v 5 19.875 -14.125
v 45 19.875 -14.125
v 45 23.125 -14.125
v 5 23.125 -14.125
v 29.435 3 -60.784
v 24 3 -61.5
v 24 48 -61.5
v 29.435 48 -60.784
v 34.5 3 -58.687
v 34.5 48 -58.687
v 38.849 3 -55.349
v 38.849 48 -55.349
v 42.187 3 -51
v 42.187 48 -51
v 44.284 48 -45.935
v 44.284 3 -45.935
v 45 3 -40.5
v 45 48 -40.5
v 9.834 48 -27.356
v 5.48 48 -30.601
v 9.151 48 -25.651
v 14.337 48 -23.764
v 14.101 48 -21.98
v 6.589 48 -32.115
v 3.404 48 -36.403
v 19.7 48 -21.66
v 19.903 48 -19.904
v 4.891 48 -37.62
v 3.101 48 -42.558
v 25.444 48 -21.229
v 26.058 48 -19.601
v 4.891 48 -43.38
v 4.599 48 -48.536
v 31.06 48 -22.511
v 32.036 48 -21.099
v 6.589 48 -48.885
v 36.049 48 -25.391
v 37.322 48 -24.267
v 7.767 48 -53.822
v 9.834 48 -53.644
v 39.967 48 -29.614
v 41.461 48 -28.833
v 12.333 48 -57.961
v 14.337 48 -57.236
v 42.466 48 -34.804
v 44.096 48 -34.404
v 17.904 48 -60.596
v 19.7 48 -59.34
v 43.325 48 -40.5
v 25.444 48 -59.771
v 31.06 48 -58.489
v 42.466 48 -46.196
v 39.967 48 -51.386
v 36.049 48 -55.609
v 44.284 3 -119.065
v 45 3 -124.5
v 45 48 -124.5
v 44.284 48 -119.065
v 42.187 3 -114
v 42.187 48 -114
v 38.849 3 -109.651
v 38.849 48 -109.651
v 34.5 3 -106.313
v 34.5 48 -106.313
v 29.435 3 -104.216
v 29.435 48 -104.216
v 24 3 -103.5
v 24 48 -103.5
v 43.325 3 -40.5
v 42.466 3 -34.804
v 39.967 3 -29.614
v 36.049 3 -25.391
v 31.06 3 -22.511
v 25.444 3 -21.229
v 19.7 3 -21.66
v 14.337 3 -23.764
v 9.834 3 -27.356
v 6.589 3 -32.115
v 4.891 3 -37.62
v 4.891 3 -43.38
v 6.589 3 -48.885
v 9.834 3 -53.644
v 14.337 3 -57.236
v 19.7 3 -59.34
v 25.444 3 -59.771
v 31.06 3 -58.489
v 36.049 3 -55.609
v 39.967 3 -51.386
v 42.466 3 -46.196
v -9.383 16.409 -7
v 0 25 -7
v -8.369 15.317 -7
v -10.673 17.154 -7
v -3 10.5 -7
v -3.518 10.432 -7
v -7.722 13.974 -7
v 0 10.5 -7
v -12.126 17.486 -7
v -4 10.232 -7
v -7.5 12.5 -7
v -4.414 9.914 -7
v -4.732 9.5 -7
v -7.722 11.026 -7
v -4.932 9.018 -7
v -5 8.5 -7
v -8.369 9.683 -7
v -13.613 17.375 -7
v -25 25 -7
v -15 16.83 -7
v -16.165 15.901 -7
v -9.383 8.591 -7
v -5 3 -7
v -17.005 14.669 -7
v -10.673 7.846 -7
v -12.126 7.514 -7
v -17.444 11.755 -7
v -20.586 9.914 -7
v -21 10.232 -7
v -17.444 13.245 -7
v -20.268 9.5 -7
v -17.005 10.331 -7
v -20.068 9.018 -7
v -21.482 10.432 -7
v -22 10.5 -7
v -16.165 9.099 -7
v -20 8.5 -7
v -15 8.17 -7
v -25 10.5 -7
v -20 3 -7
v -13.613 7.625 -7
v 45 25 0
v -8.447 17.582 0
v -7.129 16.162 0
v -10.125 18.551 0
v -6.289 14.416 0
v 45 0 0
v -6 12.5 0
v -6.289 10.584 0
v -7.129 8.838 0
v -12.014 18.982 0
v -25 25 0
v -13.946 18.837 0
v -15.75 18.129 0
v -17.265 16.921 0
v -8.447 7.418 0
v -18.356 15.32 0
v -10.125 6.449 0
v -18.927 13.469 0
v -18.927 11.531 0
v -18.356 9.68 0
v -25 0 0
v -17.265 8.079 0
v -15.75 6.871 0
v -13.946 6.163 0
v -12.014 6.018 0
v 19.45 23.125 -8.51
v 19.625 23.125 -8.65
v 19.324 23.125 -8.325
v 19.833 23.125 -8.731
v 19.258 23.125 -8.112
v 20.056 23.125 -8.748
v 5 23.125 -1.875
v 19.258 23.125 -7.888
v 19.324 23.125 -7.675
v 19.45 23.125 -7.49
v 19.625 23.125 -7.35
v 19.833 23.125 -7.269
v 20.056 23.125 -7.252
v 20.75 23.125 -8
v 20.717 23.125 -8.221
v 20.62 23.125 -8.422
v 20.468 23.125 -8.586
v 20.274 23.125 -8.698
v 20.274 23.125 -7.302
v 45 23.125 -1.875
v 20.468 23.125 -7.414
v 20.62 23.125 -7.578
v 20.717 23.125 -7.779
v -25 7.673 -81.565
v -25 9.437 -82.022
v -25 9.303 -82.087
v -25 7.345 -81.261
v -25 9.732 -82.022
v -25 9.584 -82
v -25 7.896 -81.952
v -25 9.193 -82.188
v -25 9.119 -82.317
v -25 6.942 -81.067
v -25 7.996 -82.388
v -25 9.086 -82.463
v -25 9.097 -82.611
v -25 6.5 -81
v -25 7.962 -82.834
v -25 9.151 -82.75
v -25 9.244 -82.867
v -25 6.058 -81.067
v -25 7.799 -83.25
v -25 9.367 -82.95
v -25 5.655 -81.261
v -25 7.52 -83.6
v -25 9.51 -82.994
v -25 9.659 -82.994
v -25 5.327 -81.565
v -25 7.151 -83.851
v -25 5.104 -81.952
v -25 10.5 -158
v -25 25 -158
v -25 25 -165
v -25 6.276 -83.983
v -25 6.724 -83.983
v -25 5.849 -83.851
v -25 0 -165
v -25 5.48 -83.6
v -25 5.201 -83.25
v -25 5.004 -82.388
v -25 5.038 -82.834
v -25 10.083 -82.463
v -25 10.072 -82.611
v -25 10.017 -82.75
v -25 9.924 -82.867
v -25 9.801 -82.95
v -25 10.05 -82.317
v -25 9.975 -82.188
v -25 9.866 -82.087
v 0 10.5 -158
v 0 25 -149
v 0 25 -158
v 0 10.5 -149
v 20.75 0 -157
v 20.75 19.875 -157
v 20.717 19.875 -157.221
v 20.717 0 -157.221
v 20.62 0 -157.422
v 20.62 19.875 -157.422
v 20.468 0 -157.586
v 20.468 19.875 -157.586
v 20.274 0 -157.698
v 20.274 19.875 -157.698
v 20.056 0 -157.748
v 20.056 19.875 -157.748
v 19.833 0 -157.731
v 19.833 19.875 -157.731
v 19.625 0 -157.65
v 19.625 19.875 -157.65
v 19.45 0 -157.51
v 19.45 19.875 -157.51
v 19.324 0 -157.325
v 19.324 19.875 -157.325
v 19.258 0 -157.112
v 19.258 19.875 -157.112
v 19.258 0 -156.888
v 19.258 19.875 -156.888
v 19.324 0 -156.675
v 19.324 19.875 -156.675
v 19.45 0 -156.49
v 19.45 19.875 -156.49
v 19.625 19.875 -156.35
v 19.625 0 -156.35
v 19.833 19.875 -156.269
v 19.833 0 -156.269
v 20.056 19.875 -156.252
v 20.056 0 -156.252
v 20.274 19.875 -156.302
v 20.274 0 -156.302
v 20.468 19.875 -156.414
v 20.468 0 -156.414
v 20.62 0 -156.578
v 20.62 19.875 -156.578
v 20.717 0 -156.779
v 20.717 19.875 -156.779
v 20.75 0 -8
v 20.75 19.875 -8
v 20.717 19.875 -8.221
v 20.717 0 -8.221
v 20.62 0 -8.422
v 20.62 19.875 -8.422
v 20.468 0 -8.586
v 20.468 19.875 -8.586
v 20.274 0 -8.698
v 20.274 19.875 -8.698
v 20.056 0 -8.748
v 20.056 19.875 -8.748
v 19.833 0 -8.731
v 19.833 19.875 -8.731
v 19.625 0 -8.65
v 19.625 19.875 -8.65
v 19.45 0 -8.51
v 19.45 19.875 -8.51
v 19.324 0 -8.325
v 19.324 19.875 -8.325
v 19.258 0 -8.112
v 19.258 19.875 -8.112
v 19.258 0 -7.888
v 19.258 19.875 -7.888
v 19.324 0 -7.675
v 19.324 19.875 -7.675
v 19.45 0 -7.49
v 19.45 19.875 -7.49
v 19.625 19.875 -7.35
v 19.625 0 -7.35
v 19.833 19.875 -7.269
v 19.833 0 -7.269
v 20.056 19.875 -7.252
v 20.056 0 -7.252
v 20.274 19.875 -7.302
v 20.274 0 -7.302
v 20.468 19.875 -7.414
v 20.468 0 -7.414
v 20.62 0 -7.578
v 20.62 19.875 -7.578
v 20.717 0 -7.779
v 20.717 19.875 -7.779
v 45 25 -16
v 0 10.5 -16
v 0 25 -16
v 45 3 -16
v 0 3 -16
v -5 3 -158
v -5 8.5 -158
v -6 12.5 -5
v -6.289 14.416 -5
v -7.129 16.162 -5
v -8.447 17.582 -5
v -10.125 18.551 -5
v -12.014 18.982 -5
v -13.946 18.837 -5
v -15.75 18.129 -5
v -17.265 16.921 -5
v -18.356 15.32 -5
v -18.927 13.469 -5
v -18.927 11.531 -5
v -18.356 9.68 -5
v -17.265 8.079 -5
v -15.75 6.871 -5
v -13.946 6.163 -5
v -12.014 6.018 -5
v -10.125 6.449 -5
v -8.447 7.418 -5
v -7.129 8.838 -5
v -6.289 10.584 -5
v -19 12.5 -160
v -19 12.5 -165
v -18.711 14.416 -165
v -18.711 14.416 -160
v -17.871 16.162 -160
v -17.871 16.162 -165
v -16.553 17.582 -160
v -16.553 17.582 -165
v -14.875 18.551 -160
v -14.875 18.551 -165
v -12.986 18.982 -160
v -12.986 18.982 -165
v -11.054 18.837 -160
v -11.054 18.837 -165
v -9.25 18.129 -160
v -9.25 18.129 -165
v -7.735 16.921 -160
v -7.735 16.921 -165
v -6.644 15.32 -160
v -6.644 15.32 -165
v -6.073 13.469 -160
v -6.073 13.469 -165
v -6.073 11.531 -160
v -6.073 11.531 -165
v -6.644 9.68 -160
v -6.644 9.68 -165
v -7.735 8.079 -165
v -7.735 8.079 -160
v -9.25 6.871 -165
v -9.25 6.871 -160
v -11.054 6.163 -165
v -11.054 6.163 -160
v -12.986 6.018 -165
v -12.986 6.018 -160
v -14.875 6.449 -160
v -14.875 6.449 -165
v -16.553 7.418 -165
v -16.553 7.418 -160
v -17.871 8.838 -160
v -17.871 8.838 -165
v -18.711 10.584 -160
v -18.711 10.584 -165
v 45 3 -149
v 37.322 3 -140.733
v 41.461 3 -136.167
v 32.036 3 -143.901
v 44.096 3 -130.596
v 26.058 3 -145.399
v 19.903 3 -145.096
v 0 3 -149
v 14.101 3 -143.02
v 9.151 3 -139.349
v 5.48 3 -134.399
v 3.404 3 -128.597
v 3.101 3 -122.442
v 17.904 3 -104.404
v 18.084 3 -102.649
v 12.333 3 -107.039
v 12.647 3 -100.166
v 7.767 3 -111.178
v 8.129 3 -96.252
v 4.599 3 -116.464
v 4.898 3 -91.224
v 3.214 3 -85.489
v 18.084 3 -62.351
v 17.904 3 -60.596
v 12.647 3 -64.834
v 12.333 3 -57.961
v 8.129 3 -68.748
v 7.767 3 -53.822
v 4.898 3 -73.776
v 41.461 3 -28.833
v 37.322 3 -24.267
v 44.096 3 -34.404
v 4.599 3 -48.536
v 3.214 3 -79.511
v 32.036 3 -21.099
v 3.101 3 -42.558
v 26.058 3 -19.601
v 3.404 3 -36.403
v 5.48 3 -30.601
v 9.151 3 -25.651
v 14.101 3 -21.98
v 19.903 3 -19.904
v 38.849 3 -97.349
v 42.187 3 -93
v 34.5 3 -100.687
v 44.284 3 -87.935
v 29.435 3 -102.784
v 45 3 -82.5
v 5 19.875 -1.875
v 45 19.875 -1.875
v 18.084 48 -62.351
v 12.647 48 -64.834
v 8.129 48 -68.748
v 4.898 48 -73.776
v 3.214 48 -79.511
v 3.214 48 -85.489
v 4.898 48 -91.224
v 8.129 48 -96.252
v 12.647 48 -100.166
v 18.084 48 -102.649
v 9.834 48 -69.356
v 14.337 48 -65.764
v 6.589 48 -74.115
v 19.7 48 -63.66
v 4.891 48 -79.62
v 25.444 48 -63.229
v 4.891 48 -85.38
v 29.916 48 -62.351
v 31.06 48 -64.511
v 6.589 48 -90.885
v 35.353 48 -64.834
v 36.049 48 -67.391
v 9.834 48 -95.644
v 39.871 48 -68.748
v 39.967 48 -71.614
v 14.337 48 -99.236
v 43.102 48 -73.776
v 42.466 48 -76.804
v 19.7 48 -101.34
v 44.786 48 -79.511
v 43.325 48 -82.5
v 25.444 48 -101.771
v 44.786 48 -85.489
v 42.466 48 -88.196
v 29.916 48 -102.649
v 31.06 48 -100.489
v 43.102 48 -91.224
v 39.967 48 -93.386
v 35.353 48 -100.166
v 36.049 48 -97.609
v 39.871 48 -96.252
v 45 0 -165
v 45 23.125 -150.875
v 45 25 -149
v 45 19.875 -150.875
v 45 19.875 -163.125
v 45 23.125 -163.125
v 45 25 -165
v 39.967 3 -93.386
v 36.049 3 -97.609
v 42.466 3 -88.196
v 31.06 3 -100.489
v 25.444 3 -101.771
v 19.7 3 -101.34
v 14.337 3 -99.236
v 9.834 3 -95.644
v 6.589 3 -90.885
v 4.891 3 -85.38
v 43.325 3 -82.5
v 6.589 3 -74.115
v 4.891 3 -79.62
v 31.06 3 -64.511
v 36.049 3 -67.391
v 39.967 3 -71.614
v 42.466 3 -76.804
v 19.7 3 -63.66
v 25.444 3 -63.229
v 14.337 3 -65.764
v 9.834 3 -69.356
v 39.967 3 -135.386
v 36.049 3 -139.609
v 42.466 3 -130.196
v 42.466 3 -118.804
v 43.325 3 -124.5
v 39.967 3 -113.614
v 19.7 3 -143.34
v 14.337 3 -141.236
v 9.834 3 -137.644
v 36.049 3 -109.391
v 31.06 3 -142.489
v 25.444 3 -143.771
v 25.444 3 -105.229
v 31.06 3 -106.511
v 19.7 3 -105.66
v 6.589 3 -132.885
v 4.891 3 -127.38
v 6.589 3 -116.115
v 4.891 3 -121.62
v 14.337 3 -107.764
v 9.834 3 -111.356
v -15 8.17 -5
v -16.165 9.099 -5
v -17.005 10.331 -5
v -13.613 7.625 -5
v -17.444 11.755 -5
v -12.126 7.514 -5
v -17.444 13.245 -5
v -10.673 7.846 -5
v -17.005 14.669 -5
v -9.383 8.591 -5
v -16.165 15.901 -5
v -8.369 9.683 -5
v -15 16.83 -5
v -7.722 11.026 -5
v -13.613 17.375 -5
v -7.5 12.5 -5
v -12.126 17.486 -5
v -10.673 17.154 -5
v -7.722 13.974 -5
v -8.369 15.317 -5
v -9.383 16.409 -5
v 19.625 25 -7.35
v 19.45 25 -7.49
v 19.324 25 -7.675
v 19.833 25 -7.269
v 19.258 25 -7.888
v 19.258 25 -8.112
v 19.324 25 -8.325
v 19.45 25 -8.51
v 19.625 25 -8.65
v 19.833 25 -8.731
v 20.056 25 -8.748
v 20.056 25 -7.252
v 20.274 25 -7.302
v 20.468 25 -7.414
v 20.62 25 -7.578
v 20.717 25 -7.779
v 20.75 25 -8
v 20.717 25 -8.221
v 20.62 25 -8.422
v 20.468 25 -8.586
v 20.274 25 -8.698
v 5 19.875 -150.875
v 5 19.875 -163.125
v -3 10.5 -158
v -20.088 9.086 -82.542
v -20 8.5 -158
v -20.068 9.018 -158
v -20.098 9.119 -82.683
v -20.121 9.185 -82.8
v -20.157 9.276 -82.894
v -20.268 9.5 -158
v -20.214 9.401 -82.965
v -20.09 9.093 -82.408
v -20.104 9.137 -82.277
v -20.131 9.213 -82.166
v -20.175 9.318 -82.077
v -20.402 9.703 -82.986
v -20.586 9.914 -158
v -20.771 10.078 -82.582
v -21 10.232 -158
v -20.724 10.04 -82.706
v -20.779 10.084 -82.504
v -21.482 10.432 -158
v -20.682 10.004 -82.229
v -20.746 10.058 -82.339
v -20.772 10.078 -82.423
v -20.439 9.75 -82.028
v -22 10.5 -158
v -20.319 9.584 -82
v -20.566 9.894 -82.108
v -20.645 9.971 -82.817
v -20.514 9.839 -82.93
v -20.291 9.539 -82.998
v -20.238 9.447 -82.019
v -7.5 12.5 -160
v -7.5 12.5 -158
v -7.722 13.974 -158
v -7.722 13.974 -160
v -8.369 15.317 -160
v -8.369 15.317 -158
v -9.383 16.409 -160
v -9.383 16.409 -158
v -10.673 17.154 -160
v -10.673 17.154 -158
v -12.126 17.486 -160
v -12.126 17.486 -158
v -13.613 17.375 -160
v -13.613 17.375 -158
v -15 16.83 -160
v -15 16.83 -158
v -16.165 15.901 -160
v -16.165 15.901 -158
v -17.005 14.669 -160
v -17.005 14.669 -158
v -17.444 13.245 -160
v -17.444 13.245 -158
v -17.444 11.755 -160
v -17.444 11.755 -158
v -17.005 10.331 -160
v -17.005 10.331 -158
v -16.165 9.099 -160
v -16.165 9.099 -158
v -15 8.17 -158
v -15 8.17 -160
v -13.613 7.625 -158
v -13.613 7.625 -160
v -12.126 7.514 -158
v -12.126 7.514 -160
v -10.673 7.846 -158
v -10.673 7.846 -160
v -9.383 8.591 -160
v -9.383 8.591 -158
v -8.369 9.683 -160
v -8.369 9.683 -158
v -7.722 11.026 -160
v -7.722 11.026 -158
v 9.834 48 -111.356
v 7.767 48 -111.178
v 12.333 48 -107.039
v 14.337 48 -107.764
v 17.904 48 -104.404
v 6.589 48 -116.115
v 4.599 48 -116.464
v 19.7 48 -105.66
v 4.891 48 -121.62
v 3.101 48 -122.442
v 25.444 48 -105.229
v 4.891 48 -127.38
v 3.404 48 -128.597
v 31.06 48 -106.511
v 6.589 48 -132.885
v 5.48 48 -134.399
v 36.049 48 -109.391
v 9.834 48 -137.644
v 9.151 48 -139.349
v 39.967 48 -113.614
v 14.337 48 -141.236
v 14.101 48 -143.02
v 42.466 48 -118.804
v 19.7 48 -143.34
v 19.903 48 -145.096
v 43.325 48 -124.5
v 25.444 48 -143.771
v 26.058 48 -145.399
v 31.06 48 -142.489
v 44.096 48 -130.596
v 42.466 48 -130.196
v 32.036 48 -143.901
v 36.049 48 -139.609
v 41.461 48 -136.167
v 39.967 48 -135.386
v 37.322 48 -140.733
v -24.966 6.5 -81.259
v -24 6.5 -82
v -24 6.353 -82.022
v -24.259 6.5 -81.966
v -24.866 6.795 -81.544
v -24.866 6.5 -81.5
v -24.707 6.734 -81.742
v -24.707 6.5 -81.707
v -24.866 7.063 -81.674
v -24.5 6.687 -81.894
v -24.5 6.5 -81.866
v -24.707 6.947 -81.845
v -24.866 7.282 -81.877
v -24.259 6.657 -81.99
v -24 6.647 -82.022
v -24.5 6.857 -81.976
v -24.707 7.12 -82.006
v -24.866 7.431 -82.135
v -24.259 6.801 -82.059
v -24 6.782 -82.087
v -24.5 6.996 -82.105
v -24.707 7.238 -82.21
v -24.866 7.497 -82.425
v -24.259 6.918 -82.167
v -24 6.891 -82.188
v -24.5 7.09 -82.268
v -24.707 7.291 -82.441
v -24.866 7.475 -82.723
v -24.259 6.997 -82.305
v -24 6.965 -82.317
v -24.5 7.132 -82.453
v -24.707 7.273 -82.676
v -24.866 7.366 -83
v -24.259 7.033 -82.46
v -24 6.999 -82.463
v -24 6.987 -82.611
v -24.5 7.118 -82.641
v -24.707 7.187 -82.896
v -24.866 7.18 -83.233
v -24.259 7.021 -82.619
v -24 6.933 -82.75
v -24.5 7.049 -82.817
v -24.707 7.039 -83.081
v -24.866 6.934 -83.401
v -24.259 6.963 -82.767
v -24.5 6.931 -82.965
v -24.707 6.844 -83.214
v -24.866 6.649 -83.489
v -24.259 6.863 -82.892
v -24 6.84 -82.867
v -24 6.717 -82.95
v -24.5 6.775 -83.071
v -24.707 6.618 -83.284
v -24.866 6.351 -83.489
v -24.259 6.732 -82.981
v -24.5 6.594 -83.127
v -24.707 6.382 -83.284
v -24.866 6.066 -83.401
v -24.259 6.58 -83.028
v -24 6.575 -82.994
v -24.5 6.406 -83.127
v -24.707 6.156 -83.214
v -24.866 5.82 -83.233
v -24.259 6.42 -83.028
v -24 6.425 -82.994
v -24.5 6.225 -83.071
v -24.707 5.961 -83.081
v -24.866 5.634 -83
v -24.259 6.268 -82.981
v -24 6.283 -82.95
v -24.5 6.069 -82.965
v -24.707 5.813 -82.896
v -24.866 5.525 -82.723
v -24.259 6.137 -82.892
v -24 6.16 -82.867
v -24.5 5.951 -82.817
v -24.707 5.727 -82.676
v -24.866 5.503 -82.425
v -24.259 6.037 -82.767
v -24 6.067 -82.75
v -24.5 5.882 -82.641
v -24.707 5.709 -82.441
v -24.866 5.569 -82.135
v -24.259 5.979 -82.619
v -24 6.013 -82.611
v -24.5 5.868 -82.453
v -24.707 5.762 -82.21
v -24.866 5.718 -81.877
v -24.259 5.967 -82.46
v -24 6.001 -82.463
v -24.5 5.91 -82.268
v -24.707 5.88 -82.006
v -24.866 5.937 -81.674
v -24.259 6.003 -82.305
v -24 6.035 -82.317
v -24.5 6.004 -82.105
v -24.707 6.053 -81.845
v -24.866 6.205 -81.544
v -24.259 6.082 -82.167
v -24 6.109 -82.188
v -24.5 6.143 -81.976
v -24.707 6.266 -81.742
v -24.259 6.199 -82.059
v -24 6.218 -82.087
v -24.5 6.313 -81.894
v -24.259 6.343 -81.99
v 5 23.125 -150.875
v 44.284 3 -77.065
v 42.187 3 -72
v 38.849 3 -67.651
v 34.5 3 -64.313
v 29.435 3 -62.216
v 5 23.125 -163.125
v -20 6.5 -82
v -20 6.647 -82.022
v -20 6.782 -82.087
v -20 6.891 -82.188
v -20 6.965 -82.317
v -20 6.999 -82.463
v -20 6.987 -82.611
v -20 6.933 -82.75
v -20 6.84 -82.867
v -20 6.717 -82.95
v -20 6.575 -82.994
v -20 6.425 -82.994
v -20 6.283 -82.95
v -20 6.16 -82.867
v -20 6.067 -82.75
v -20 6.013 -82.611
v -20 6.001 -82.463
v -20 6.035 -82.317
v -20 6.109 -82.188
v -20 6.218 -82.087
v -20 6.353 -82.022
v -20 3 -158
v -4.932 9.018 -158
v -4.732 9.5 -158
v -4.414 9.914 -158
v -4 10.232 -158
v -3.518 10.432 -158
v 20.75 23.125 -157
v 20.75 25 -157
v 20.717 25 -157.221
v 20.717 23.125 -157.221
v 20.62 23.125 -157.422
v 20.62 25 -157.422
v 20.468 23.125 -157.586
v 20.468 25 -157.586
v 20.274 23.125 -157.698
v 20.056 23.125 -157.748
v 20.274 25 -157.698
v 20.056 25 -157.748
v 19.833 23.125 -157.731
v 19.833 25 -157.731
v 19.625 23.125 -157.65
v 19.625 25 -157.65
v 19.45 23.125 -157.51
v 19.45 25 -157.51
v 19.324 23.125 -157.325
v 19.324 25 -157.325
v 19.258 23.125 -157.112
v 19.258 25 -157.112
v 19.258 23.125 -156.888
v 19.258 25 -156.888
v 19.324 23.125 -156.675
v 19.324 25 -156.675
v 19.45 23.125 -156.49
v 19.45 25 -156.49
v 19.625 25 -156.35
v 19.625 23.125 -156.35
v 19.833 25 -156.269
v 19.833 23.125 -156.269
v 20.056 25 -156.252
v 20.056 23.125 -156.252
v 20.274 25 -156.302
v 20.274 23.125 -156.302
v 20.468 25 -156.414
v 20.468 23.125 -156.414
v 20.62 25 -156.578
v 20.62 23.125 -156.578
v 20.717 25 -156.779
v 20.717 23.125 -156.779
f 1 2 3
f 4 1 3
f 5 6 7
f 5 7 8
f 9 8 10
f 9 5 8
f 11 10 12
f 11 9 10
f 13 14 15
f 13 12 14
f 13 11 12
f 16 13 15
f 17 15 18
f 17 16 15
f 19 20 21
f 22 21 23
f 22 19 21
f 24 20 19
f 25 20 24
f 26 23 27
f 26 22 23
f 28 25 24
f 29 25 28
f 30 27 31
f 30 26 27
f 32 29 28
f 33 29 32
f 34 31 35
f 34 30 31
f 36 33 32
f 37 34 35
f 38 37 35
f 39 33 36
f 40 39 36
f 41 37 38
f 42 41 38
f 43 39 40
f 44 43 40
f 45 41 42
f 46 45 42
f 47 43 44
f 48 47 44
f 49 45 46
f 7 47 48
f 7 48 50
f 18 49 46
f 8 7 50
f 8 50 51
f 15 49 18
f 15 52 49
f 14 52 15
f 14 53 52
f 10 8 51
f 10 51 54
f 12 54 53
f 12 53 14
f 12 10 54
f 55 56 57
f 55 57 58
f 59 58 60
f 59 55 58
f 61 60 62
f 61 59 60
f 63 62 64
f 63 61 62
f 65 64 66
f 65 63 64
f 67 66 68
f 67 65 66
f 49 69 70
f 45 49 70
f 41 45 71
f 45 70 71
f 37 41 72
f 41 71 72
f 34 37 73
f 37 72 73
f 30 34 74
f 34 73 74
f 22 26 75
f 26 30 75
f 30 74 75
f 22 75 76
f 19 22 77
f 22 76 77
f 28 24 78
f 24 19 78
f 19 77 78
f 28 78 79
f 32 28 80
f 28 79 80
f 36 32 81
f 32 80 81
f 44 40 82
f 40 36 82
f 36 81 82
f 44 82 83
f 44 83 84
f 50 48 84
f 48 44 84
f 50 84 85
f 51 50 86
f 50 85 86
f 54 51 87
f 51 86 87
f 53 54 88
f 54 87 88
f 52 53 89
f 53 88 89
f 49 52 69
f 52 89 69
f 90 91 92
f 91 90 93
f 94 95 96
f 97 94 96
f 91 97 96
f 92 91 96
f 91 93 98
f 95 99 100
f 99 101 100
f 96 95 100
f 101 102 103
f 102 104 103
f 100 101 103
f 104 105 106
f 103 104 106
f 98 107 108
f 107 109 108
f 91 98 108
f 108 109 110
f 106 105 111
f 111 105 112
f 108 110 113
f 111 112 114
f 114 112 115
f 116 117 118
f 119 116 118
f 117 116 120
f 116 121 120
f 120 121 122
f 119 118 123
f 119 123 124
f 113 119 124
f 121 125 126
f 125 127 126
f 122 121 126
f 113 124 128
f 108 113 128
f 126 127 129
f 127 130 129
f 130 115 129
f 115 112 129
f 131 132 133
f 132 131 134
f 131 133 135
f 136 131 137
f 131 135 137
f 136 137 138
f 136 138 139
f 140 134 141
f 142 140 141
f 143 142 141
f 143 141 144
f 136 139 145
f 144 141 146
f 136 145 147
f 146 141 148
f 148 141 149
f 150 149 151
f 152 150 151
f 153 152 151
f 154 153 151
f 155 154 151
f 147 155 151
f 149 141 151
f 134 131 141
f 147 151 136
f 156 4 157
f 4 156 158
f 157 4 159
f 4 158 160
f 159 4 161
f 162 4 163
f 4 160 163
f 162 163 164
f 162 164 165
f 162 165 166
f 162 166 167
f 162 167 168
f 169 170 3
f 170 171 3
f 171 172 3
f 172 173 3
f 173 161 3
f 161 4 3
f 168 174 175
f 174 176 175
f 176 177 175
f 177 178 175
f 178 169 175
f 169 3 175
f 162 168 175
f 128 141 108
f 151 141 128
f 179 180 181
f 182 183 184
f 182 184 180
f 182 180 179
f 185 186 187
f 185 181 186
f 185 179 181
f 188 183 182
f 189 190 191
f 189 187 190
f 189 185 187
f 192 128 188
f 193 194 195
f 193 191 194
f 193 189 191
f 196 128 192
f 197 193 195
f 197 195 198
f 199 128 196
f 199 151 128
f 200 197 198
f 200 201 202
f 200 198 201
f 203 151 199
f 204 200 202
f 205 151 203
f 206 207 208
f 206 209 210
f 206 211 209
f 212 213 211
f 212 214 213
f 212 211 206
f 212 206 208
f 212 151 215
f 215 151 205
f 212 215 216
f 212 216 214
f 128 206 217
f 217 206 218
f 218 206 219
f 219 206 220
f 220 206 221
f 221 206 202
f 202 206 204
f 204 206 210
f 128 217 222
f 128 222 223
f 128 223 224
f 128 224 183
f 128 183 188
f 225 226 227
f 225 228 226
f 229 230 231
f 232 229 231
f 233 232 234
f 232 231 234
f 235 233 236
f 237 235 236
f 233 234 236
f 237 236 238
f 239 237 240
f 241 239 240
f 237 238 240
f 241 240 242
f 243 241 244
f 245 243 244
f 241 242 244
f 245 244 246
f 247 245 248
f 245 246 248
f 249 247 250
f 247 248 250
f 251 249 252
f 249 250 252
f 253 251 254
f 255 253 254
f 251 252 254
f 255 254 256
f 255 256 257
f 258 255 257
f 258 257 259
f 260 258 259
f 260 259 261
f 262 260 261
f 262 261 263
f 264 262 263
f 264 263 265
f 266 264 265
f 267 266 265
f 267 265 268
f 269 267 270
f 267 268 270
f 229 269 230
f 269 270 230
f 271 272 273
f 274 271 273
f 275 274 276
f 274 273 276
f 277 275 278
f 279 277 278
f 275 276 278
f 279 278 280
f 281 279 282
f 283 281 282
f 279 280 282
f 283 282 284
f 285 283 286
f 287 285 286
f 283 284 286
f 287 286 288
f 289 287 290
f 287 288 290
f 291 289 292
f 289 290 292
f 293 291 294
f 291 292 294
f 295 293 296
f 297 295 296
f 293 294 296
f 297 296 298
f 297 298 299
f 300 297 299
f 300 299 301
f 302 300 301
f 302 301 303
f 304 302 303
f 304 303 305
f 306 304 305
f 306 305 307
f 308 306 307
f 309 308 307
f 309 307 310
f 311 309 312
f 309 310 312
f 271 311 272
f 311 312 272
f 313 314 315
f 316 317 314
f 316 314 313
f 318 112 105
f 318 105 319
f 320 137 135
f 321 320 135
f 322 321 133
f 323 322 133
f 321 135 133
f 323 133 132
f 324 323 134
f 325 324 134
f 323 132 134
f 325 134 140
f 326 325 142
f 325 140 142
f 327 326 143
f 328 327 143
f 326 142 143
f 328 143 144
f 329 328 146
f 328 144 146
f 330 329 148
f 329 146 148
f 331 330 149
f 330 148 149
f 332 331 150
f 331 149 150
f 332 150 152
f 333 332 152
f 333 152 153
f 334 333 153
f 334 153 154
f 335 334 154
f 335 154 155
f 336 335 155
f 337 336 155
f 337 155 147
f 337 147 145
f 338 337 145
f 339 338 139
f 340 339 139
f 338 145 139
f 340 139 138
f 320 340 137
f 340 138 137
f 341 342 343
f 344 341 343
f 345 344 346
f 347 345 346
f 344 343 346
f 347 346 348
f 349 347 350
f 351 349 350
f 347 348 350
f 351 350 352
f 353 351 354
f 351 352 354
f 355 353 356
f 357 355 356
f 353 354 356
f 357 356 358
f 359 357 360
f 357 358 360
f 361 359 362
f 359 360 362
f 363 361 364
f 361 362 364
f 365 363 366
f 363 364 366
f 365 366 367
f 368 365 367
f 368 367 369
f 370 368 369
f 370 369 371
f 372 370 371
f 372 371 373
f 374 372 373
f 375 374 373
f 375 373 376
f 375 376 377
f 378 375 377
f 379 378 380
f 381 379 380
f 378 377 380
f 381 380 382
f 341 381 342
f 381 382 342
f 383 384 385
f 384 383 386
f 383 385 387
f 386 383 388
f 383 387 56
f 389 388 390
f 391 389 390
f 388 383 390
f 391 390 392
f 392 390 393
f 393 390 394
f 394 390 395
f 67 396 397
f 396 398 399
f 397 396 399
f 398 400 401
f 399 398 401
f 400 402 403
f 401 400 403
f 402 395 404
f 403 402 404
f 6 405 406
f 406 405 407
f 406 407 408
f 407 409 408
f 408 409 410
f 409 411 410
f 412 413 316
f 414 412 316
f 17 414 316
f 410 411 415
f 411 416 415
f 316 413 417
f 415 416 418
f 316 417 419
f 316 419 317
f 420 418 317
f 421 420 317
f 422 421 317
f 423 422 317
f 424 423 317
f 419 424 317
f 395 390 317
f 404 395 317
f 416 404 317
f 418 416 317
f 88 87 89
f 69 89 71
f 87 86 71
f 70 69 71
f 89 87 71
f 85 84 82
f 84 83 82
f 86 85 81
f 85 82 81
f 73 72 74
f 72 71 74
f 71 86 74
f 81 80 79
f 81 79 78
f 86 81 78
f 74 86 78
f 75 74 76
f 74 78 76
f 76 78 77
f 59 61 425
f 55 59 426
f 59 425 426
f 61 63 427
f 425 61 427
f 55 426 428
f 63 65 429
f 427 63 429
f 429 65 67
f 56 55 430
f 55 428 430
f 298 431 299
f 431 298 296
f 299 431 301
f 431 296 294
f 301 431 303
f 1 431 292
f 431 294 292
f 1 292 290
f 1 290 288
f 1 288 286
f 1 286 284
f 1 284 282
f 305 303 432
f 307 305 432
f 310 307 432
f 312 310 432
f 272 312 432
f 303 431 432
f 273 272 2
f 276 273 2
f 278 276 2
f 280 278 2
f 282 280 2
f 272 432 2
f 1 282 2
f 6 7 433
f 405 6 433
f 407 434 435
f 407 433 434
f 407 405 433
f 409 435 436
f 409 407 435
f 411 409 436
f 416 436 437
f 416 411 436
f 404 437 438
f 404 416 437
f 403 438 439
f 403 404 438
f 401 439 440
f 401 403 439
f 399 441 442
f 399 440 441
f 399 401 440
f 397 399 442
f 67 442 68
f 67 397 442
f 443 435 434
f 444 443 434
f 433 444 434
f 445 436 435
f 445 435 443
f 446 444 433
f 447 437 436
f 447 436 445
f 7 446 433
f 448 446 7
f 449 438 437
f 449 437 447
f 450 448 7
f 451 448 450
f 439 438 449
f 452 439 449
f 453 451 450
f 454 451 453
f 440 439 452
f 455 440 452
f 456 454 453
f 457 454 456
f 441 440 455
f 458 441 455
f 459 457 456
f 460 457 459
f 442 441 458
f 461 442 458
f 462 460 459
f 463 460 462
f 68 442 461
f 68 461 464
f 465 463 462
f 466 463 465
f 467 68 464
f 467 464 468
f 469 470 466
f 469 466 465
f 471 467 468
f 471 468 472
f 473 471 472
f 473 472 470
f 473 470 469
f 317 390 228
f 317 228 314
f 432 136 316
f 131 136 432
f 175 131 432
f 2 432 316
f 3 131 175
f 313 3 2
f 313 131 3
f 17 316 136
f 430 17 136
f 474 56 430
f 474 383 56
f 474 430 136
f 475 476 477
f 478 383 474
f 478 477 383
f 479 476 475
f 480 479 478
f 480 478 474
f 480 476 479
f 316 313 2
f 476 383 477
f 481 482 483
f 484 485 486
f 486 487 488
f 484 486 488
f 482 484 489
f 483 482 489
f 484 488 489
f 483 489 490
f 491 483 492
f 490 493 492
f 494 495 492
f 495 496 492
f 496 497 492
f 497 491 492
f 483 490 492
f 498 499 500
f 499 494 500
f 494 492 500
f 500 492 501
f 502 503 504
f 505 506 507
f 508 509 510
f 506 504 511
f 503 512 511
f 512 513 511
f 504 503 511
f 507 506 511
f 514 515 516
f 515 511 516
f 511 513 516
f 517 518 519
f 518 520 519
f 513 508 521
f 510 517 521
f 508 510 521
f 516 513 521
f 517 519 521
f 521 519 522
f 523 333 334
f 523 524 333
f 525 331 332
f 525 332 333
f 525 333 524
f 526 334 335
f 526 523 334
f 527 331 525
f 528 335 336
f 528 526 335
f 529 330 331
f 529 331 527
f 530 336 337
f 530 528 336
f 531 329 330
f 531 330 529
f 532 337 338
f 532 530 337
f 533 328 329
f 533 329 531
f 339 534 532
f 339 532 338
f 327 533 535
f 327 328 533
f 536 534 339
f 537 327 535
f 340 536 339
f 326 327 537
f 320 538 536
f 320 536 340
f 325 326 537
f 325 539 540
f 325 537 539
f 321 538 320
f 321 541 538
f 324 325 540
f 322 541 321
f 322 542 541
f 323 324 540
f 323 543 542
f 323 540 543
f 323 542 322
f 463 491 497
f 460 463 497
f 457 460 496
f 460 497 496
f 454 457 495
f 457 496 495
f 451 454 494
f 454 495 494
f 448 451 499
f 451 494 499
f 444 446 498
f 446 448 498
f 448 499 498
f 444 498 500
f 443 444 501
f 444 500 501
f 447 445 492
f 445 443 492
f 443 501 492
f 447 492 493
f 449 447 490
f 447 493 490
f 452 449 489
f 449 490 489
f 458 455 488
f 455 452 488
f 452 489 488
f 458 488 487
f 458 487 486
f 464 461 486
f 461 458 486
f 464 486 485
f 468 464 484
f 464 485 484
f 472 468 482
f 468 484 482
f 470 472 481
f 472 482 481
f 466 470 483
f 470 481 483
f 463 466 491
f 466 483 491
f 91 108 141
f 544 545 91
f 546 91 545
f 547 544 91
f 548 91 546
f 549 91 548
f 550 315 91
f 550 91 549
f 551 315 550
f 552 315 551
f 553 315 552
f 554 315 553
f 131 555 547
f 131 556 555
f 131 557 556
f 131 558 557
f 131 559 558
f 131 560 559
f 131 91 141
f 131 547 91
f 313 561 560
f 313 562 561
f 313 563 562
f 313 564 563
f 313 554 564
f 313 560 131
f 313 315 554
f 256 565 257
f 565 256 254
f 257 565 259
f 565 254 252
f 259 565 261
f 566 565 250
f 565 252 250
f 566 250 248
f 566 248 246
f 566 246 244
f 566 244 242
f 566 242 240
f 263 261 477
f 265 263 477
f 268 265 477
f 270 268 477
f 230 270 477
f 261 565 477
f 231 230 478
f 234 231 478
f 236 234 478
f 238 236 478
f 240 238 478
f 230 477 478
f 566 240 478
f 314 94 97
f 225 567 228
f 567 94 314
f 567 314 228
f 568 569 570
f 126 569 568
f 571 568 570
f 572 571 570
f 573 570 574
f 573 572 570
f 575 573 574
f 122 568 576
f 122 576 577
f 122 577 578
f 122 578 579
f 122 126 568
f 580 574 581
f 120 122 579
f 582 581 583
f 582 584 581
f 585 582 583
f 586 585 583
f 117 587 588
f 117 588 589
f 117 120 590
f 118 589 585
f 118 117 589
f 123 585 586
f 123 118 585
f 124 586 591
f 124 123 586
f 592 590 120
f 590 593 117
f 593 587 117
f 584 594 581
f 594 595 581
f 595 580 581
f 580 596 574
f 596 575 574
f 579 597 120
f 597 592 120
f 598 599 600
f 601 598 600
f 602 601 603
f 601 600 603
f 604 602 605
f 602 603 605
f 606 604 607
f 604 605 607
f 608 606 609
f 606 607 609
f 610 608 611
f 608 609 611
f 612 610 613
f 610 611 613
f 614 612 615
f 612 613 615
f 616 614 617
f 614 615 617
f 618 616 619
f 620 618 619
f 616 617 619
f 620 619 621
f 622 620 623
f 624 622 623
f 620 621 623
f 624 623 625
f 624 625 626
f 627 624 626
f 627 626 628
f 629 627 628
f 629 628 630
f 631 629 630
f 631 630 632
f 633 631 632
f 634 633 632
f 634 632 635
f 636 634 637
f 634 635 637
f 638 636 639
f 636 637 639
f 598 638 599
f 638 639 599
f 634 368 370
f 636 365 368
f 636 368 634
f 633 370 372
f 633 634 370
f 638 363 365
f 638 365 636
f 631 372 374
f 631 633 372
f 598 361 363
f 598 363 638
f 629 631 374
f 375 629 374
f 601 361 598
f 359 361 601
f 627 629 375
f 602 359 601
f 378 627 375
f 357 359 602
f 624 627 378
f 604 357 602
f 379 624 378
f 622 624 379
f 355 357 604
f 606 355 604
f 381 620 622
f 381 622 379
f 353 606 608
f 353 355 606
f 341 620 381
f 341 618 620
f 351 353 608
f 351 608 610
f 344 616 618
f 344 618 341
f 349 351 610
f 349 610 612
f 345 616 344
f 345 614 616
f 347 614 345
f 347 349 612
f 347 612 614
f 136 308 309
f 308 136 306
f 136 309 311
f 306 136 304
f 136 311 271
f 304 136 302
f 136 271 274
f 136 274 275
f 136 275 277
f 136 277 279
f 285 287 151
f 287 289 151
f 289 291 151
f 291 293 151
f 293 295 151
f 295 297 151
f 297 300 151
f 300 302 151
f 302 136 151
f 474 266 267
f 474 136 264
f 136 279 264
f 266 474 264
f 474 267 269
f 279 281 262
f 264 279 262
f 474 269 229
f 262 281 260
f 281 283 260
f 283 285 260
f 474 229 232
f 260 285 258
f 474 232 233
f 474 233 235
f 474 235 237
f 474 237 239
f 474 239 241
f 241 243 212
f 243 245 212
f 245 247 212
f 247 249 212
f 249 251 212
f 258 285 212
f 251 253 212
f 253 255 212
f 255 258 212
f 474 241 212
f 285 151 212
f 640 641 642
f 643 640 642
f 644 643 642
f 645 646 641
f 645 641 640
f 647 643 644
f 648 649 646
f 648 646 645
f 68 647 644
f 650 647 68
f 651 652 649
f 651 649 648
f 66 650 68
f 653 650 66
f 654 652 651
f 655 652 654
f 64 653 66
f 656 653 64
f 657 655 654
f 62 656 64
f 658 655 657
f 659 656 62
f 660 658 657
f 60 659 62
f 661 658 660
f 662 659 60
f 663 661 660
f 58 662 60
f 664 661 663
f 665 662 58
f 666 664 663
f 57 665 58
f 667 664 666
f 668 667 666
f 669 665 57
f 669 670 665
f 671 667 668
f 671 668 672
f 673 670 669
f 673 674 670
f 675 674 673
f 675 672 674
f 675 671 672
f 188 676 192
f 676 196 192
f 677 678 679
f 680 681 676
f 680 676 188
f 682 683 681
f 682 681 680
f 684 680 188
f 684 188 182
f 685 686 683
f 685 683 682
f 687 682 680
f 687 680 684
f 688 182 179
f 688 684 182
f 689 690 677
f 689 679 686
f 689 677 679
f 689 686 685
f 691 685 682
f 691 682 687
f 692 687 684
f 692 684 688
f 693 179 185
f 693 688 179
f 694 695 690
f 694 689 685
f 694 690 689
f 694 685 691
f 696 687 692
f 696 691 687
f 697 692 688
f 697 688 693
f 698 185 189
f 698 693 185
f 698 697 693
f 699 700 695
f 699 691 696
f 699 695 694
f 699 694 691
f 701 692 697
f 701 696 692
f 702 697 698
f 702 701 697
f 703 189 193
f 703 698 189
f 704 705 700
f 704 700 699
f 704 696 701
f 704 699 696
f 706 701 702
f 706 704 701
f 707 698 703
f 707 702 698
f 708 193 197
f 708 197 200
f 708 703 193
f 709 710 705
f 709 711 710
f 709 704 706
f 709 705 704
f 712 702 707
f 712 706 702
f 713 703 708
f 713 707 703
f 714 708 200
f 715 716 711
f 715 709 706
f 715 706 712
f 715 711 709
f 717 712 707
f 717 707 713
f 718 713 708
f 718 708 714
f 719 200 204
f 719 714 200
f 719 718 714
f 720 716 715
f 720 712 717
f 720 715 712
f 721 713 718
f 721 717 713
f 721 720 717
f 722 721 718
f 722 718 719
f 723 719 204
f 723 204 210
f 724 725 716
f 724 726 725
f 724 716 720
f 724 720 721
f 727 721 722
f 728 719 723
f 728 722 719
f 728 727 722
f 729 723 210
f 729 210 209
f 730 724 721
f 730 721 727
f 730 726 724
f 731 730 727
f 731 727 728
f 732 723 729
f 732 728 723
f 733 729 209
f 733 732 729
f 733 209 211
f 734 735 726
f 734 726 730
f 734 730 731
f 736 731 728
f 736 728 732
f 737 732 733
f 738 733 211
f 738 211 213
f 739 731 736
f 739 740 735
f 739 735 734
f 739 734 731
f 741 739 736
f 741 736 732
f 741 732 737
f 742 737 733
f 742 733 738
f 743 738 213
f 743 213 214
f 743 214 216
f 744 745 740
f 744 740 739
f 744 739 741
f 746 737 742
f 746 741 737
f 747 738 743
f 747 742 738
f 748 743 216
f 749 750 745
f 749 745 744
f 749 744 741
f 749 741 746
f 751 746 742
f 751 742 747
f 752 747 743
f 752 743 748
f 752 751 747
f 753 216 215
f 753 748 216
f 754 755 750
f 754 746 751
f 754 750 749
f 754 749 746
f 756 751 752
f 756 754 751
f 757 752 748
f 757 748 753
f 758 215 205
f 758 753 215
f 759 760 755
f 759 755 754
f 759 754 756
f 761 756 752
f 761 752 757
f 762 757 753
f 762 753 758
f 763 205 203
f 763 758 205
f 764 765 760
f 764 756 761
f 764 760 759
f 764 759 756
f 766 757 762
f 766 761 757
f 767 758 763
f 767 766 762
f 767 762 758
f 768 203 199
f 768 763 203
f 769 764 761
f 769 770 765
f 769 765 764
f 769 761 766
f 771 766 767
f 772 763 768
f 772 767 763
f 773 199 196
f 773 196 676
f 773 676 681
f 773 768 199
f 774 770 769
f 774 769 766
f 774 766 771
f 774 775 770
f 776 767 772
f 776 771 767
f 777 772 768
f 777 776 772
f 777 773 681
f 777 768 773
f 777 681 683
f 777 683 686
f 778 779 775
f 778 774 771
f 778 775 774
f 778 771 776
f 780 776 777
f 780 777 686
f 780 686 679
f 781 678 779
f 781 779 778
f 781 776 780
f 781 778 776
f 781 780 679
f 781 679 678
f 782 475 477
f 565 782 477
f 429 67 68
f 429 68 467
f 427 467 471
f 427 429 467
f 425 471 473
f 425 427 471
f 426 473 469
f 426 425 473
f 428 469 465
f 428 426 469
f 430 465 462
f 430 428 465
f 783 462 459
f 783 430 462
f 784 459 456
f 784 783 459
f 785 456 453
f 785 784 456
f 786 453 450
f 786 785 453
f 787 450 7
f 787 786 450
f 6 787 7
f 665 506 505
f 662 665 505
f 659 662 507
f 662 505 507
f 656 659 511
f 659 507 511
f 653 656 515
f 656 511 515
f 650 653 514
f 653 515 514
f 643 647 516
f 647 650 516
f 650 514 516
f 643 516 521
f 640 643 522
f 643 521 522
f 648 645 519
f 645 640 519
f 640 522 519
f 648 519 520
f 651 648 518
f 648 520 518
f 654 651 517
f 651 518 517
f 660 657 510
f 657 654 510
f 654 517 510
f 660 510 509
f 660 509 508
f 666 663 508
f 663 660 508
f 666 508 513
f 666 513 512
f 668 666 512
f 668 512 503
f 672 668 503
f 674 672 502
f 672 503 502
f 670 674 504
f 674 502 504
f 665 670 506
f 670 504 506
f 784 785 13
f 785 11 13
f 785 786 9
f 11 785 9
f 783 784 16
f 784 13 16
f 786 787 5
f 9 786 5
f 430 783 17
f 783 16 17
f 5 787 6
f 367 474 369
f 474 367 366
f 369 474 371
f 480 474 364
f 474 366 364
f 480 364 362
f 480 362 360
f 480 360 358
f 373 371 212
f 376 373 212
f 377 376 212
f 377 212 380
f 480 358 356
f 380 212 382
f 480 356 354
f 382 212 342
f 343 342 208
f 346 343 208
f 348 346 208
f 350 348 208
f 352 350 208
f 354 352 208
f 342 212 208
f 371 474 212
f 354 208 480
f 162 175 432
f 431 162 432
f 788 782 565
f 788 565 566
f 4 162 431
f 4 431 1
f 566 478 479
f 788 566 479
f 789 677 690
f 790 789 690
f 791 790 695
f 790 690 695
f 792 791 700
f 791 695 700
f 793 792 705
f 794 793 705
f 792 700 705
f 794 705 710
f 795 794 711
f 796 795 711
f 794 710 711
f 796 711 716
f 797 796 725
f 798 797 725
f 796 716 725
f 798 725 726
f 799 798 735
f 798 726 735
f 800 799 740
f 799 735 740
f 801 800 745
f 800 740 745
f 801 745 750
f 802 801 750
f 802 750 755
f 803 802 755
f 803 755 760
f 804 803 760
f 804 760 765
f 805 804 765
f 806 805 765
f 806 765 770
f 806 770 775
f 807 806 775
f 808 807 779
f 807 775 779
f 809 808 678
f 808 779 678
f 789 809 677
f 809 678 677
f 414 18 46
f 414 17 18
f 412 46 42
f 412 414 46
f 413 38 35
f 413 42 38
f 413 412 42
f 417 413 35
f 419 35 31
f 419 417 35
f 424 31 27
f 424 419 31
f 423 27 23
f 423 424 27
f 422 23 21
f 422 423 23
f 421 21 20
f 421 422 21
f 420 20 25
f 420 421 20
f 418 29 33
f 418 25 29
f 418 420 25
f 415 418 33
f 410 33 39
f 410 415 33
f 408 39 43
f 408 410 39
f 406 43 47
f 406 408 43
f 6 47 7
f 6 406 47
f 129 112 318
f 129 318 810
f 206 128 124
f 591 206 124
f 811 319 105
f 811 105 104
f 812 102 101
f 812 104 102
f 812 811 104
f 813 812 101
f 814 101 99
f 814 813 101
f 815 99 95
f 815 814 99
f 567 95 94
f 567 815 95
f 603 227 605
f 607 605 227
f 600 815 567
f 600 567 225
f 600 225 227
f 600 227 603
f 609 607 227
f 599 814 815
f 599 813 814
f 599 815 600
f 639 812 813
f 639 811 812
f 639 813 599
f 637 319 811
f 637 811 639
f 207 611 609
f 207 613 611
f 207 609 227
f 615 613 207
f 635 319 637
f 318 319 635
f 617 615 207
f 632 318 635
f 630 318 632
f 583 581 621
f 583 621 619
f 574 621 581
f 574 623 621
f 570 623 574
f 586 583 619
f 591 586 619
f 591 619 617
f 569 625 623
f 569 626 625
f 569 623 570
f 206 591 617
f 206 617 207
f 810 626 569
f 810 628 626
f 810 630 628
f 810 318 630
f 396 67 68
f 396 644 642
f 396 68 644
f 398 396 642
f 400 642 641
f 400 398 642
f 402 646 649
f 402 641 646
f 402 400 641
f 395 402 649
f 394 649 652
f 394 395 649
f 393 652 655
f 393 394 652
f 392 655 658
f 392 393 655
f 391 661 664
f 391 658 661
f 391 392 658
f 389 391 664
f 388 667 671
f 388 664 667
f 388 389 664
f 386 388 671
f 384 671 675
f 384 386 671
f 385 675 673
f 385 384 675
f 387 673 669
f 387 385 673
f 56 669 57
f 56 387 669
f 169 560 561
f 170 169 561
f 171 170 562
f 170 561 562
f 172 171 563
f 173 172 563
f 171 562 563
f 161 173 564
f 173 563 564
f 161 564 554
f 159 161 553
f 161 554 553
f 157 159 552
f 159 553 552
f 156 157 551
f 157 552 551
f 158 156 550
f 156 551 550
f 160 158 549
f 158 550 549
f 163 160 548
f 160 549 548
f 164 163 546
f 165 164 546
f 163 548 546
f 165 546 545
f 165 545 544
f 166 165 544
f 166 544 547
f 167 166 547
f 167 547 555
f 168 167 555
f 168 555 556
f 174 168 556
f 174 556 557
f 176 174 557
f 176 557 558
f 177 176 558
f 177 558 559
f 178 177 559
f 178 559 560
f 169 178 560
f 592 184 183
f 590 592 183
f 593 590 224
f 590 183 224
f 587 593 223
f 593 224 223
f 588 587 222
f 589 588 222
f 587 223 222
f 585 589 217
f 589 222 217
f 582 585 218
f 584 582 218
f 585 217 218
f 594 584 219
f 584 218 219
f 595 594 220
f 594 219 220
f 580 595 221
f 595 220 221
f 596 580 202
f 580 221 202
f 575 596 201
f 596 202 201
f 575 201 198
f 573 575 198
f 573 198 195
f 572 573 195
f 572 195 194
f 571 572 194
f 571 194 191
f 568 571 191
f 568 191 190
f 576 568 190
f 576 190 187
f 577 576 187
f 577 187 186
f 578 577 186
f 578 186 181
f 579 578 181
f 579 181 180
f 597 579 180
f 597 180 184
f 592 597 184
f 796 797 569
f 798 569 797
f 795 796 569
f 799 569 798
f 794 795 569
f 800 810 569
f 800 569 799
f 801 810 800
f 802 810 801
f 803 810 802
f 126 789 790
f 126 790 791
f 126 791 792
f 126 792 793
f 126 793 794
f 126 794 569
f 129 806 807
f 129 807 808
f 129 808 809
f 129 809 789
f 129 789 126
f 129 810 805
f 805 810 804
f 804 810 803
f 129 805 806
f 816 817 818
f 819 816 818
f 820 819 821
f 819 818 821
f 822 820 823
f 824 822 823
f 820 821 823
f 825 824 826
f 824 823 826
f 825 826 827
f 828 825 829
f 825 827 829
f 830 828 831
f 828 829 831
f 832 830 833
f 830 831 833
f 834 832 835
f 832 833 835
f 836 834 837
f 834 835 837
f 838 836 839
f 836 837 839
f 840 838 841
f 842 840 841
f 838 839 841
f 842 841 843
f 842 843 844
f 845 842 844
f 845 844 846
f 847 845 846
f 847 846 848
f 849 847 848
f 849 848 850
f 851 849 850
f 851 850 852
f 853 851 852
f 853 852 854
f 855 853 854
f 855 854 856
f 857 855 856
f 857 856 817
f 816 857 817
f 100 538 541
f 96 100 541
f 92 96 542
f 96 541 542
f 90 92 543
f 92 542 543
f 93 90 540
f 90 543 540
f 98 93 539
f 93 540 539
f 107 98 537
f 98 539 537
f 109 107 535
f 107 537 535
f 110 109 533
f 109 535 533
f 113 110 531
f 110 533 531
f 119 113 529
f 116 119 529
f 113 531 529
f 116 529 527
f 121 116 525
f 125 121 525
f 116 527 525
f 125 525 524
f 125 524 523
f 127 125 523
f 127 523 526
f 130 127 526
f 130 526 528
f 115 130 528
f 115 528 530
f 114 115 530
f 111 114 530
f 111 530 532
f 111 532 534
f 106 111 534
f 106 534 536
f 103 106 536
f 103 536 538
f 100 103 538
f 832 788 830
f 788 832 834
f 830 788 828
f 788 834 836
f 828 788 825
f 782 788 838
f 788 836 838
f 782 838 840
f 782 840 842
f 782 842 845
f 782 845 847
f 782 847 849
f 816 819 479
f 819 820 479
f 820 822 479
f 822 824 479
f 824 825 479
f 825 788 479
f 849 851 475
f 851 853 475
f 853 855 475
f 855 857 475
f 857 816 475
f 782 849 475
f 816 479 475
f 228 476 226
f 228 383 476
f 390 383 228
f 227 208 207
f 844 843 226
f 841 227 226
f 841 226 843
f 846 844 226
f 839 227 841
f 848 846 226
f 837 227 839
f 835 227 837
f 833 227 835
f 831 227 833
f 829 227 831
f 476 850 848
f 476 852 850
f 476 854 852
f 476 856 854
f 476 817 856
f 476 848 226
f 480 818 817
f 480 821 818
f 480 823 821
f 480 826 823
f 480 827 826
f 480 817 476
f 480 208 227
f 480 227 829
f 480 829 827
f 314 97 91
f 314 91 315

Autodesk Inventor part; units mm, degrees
ref_plane "YZ Plane" through (0, 0, 0) normal (1, 0, 0) x (0, 1, 0)
ref_plane "XZ Plane" through (0, 0, 0) normal (0, 1, 0) x (-1, 0, 0)
ref_plane "XY Plane" through (0, 0, 0) normal (0, 0, 1) x (1, 0, 0)
sketch "Sketch1" plane through (0, 0, 0) normal (0, 1, 0) x (-1, 0, 0)
  line L0 (0, 0) -> (25, 0)
  line L1 (25, 0) -> (25, -165)
  line L2 (25, -165) -> (0, -165)
  line L3 (0, -165) -> (0, 0)
  dimension "d0" = 25
  dimension "d1" = 165
extrude "Extrusion1" add sketch "Sketch1" along normal blind 3
sketch "Sketch2" plane through (0, 3, 0) normal (0, 1, 0) x (1, 0, 0)
  line L0 (-25, 165) -> (-25, 0) projected
  line L1 (0, 0) -> (0, 165) projected
  line L2 (-25, 0) -> (0, 0)
  line L3 (0, 0) -> (0, 7)
  line L4 (0, 7) -> (-25, 7)
  line L5 (-25, 7) -> (-25, 0)
  line L6 (0, 165) -> (-25, 165) projected
  line L7 (-25, 165) -> (0, 165)
  line L8 (0, 165) -> (0, 158)
  line L9 (0, 158) -> (-25, 158)
  line L10 (-25, 158) -> (-25, 165)
  dimension "d4" = 7
  dimension "d5" = 7
extrude "Extrusion2" add sketch "Sketch2" along normal blind 22 contours L6 L1 L9 L0 | L4 L1 L2 L0
sketch "Sketch3" plane through (-25, 0, 0) normal (0, 0, 1) x (1, 0, 0)
  point P0 (25, 0)
sketch "Sketch4" plane through (-25, 0, 0) normal (0, 0, 1) x (1, 0, 0)
  line L0 (25, 25) -> (0, 25) construction
  line L1 (25, 0) -> (0, 25) construction
  circle A0 centre (12.5, 12.5) radius 6.5
  dimension "d8" = 13
extrude "Extrusion3" cut sketch "Sketch4" against normal blind 5
sketch "Sketch5" plane through (0, 0, -165) normal (0, 0, -1) x (-1, 0, 0)
  circle A0 centre (12.5, 12.5) radius 6.5 projected
  circle A1 centre (12.5, 12.5) radius 6.5
  point P0 (0, 0)
extrude "Extrusion4" cut sketch "Sketch5" against normal blind 5
sketch "Sketch6" plane through (-25, 0, 0) normal (0, 0, 1) x (1, 0, 0)
  circle A0 centre (12.5, 12.5) radius 6.5 projected
  circle A1 centre (12.5, 12.5) radius 5
  point P0 (25, 0)
  dimension "d13" = 10
extrude "Extrusion5" cut sketch "Sketch6" against normal blind 165 contours A1
sketch "Sketch7" plane through (-25, 3, -158) normal (0, 0, 1) x (1, 0, 0)
  line L0 (25, 0) -> (25, 22) construction
  line L1 (0, 0) -> (0, 22) construction
  point P0 (25, -3)
sketch "Sketch8" plane through (-25, 3, -158) normal (0, 0, 1) x (1, 0, 0)
  circle A0 centre (12.5, 9.5) radius 5 projected
  point P0 (25, -3)
sketch "Sketch9" plane through (0, 3, 0) normal (0, 1, 0) x (1, 0, 0)
  line L0 (-25, 158) -> (0, 158) projected
  line L1 (0, 7) -> (-25, 7) projected
  line L2 (-25, 158) -> (-20, 158)
  line L3 (-20, 158) -> (-20, 7)
  line L4 (-20, 7) -> (-25, 7)
  line L5 (-25, 7) -> (-25, 158)
  line L6 (0, 0) -> (0, 7) projected
  line L7 (0, 7) -> (-5, 7)
  line L8 (-5, 7) -> (-5, 158)
  line L9 (-5, 158) -> (0, 158)
  line L10 (0, 158) -> (0, 7)
  dimension "d16" = 5
  dimension "d17" = 5
extrude "Extrusion6" add sketch "Sketch9" along normal blind 7.5 contours L0 L3 L1 L5 | L0 L10 L1 L8
fillet "Fillet1" radius 2 2 edges at (-5, 10.5, -82.5) (-20, 10.5, -82.5)
sketch "Sketch10" plane through (0, 0, 0) normal (1, 0, 0) x (0, 0, -1)
  line L0 (165, 0) -> (165, 25) projected
  line L1 (0, 0) -> (165, 0)
  line L2 (165, 0) -> (165, 3)
  line L3 (165, 3) -> (0, 3)
  line L4 (0, 3) -> (0, 0)
  dimension "d21" = 3
extrude "Extrusion7" add sketch "Sketch10" along normal blind 45
sketch "Sketch11" plane through (0, 3, 0) normal (0, 1, 0) x (1, 0, 0)
  line L0 (45, 165) -> (45, 0) construction
  line L1 (0, 165) -> (-25, 165) construction
  line L2 (45, 82.5) -> (3, 82.5) construction
  circle A0 centre (24, 82.5) radius 21 construction
  circle A1 centre (24, 124.5) radius 21 construction
  circle A2 centre (24, 124.5) radius 21
  circle A3 centre (24, 82.5) radius 21
  circle A4 centre (24, 40.5) radius 21
  circle A5 centre (24, 40.5) radius 19.325
  circle A6 centre (24, 82.5) radius 19.325
  circle A7 centre (24, 124.5) radius 19.325
  point P0 (0, 0)
  dimension "d24" = 42
  dimension "d25" = 38.65
  dimension "d26" = 38.65
  dimension "d27" = 38.65
extrude "Extrusion8" add sketch "Sketch11" along normal blind 45
sketch "Sketch12" plane through (0, 3, 0) normal (0, 1, 0) x (1, 0, 0)
  point P0 (0, 0)
sketch "Sketch13" plane through (0, 3, 0) normal (0, 1, 0) x (1, 0, 0)
  line L0 (45, 40.5) -> (45, 0) projected
  line L1 (0, 0) -> (0, 165) projected
  line L2 (45, 0) -> (0, 0)
  line L3 (0, 0) -> (0, 16)
  line L4 (0, 16) -> (45, 16)
  line L5 (45, 16) -> (45, 0)
  line L6 (45, 165) -> (45, 124.5) projected
  line L7 (0, 165) -> (45, 165)
  line L8 (45, 165) -> (45, 149)
  line L9 (45, 149) -> (0, 149)
  line L10 (0, 149) -> (0, 165)
  dimension "d30" = 16
  dimension "d31" = 16
extrude "Extrusion9" add sketch "Sketch13" along normal blind 22
sketch "Sketch14" plane through (45, 0, 0) normal (1, 0, 0) x (0, 0, -1)
  line L0 (0, 25) -> (16, 25) construction
  line L1 (8, 25) -> (8, 21.5) construction
  line L2 (14.125, 23.125) -> (1.875, 23.125)
  line L3 (1.875, 23.125) -> (1.875, 19.875)
  line L4 (1.875, 19.875) -> (14.125, 19.875)
  line L5 (14.125, 19.875) -> (14.125, 23.125)
  line L6 (14.125, 23.125) -> (1.875, 19.875) construction
  line L7 (1.875, 23.125) -> (14.125, 19.875) construction
  point P0 (0, 0)
  dimension "d35" = 3.5
  dimension "d36" = 12.25
  dimension "d37" = 3.25
sketch "Sketch15" plane through (45, 0, 0) normal (1, 0, 0) x (0, 0, -1)
  line L0 (149, 25) -> (165, 25) construction
  line L1 (157, 25) -> (157, 21.5) construction
  line L2 (163.125, 23.125) -> (150.875, 23.125)
  line L3 (150.875, 23.125) -> (150.875, 19.875)
  line L4 (150.875, 19.875) -> (163.125, 19.875)
  line L5 (163.125, 19.875) -> (163.125, 23.125)
  line L6 (163.125, 23.125) -> (150.875, 19.875) construction
  line L7 (150.875, 23.125) -> (163.125, 19.875) construction
  point P0 (0, 0)
  dimension "d38" = 3.5
  dimension "d39" = 12.25
  dimension "d40" = 3.25
extrude "Extrusion10" cut sketch "Sketch14" against normal blind 40
extrude "Extrusion11" cut sketch "Sketch15" against normal blind 40
sketch "Sketch16" plane through (0, 25, 0) normal (0, 1, 0) x (1, 0, 0)
  line L0 (45, 0) -> (45, 16) construction
  line L1 (45, 8) -> (20, 8) construction
  circle A0 centre (20, 8) radius 0.75 construction
  circle A1 centre (20, 8) radius 0.75
  point P0 (0, 0)
  dimension "d45" = 25
  dimension "d46" = 1.5
extrude "Extrusion12" cut sketch "Sketch16" against normal blind 25
sketch "Sketch17" plane through (0, 25, 0) normal (0, 1, 0) x (1, 0, 0)
  point P0 (0, 0)
sketch "Sketch18" plane through (0, 25, 0) normal (0, 1, 0) x (1, 0, 0)
  point P0 (0, 0)
sketch "Sketch19" plane through (0, 25, 0) normal (0, 1, 0) x (1, 0, 0)
  point P0 (0, 0)
sketch "Sketch20" plane through (0, 25, 0) normal (0, 1, 0) x (1, 0, 0)
  line L0 (0, 149) -> (45, 149) construction
  line L1 (45, 0) -> (45, 165) construction
  line L2 (45, 149) -> (45, 165) construction
  line L3 (45, 157) -> (20, 157) construction
  circle A0 centre (20, 157) radius 0.75
  point P0 (0, 0)
  dimension "d49" = 25
  dimension "d50" = 1.5
extrude "Extrusion13" cut sketch "Sketch20" against normal blind 25
sketch "Sketch21" plane through (-25, 0, -165) normal (-1, 0, 0) x (0, 0, 1)
  point P0 (165, 0)
sketch "Sketch22" plane through (-25, 0, -165) normal (-1, 0, 0) x (0, 0, 1)
  line L0 (158, 8.5) -> (7, 8.5) construction
  line L1 (82.5, 8.5) -> (82.5, 6.5) construction
  circle A0 centre (82.5, 6.5) radius 0.5
  point P0 (165, 0)
  dimension "d53" = 2
  dimension "d54" = 1
extrude "Extrusion14" cut sketch "Sketch22" against normal blind 5.25
fillet "Fillet2" radius 1 1 edges at (-25, 6.5, -83)
sketch "Sketch23" plane through (-25, 0, -165) normal (-1, 0, 0) x (0, 0, 1)
  circle A0 centre (82.5, 9.5843) radius 0.5
  point P0 (165, 0)
  dimension "d58" = 1
extrude "Extrusion15" cut sketch "Sketch23" against normal blind 5.25
sketch "Sketch24" plane through (0, 48, 0) normal (0, 1, 0) x (1, 0, 0)
  line L0 (0, 0) -> (48.5926, 0)
  line L1 (48.5926, 0) -> (48.5926, 173.5031)
  line L2 (48.5926, 173.5031) -> (0, 173.5031)
  line L3 (0, 173.5031) -> (0, 0)
properties part number "rearAxelHolder 11-28"
